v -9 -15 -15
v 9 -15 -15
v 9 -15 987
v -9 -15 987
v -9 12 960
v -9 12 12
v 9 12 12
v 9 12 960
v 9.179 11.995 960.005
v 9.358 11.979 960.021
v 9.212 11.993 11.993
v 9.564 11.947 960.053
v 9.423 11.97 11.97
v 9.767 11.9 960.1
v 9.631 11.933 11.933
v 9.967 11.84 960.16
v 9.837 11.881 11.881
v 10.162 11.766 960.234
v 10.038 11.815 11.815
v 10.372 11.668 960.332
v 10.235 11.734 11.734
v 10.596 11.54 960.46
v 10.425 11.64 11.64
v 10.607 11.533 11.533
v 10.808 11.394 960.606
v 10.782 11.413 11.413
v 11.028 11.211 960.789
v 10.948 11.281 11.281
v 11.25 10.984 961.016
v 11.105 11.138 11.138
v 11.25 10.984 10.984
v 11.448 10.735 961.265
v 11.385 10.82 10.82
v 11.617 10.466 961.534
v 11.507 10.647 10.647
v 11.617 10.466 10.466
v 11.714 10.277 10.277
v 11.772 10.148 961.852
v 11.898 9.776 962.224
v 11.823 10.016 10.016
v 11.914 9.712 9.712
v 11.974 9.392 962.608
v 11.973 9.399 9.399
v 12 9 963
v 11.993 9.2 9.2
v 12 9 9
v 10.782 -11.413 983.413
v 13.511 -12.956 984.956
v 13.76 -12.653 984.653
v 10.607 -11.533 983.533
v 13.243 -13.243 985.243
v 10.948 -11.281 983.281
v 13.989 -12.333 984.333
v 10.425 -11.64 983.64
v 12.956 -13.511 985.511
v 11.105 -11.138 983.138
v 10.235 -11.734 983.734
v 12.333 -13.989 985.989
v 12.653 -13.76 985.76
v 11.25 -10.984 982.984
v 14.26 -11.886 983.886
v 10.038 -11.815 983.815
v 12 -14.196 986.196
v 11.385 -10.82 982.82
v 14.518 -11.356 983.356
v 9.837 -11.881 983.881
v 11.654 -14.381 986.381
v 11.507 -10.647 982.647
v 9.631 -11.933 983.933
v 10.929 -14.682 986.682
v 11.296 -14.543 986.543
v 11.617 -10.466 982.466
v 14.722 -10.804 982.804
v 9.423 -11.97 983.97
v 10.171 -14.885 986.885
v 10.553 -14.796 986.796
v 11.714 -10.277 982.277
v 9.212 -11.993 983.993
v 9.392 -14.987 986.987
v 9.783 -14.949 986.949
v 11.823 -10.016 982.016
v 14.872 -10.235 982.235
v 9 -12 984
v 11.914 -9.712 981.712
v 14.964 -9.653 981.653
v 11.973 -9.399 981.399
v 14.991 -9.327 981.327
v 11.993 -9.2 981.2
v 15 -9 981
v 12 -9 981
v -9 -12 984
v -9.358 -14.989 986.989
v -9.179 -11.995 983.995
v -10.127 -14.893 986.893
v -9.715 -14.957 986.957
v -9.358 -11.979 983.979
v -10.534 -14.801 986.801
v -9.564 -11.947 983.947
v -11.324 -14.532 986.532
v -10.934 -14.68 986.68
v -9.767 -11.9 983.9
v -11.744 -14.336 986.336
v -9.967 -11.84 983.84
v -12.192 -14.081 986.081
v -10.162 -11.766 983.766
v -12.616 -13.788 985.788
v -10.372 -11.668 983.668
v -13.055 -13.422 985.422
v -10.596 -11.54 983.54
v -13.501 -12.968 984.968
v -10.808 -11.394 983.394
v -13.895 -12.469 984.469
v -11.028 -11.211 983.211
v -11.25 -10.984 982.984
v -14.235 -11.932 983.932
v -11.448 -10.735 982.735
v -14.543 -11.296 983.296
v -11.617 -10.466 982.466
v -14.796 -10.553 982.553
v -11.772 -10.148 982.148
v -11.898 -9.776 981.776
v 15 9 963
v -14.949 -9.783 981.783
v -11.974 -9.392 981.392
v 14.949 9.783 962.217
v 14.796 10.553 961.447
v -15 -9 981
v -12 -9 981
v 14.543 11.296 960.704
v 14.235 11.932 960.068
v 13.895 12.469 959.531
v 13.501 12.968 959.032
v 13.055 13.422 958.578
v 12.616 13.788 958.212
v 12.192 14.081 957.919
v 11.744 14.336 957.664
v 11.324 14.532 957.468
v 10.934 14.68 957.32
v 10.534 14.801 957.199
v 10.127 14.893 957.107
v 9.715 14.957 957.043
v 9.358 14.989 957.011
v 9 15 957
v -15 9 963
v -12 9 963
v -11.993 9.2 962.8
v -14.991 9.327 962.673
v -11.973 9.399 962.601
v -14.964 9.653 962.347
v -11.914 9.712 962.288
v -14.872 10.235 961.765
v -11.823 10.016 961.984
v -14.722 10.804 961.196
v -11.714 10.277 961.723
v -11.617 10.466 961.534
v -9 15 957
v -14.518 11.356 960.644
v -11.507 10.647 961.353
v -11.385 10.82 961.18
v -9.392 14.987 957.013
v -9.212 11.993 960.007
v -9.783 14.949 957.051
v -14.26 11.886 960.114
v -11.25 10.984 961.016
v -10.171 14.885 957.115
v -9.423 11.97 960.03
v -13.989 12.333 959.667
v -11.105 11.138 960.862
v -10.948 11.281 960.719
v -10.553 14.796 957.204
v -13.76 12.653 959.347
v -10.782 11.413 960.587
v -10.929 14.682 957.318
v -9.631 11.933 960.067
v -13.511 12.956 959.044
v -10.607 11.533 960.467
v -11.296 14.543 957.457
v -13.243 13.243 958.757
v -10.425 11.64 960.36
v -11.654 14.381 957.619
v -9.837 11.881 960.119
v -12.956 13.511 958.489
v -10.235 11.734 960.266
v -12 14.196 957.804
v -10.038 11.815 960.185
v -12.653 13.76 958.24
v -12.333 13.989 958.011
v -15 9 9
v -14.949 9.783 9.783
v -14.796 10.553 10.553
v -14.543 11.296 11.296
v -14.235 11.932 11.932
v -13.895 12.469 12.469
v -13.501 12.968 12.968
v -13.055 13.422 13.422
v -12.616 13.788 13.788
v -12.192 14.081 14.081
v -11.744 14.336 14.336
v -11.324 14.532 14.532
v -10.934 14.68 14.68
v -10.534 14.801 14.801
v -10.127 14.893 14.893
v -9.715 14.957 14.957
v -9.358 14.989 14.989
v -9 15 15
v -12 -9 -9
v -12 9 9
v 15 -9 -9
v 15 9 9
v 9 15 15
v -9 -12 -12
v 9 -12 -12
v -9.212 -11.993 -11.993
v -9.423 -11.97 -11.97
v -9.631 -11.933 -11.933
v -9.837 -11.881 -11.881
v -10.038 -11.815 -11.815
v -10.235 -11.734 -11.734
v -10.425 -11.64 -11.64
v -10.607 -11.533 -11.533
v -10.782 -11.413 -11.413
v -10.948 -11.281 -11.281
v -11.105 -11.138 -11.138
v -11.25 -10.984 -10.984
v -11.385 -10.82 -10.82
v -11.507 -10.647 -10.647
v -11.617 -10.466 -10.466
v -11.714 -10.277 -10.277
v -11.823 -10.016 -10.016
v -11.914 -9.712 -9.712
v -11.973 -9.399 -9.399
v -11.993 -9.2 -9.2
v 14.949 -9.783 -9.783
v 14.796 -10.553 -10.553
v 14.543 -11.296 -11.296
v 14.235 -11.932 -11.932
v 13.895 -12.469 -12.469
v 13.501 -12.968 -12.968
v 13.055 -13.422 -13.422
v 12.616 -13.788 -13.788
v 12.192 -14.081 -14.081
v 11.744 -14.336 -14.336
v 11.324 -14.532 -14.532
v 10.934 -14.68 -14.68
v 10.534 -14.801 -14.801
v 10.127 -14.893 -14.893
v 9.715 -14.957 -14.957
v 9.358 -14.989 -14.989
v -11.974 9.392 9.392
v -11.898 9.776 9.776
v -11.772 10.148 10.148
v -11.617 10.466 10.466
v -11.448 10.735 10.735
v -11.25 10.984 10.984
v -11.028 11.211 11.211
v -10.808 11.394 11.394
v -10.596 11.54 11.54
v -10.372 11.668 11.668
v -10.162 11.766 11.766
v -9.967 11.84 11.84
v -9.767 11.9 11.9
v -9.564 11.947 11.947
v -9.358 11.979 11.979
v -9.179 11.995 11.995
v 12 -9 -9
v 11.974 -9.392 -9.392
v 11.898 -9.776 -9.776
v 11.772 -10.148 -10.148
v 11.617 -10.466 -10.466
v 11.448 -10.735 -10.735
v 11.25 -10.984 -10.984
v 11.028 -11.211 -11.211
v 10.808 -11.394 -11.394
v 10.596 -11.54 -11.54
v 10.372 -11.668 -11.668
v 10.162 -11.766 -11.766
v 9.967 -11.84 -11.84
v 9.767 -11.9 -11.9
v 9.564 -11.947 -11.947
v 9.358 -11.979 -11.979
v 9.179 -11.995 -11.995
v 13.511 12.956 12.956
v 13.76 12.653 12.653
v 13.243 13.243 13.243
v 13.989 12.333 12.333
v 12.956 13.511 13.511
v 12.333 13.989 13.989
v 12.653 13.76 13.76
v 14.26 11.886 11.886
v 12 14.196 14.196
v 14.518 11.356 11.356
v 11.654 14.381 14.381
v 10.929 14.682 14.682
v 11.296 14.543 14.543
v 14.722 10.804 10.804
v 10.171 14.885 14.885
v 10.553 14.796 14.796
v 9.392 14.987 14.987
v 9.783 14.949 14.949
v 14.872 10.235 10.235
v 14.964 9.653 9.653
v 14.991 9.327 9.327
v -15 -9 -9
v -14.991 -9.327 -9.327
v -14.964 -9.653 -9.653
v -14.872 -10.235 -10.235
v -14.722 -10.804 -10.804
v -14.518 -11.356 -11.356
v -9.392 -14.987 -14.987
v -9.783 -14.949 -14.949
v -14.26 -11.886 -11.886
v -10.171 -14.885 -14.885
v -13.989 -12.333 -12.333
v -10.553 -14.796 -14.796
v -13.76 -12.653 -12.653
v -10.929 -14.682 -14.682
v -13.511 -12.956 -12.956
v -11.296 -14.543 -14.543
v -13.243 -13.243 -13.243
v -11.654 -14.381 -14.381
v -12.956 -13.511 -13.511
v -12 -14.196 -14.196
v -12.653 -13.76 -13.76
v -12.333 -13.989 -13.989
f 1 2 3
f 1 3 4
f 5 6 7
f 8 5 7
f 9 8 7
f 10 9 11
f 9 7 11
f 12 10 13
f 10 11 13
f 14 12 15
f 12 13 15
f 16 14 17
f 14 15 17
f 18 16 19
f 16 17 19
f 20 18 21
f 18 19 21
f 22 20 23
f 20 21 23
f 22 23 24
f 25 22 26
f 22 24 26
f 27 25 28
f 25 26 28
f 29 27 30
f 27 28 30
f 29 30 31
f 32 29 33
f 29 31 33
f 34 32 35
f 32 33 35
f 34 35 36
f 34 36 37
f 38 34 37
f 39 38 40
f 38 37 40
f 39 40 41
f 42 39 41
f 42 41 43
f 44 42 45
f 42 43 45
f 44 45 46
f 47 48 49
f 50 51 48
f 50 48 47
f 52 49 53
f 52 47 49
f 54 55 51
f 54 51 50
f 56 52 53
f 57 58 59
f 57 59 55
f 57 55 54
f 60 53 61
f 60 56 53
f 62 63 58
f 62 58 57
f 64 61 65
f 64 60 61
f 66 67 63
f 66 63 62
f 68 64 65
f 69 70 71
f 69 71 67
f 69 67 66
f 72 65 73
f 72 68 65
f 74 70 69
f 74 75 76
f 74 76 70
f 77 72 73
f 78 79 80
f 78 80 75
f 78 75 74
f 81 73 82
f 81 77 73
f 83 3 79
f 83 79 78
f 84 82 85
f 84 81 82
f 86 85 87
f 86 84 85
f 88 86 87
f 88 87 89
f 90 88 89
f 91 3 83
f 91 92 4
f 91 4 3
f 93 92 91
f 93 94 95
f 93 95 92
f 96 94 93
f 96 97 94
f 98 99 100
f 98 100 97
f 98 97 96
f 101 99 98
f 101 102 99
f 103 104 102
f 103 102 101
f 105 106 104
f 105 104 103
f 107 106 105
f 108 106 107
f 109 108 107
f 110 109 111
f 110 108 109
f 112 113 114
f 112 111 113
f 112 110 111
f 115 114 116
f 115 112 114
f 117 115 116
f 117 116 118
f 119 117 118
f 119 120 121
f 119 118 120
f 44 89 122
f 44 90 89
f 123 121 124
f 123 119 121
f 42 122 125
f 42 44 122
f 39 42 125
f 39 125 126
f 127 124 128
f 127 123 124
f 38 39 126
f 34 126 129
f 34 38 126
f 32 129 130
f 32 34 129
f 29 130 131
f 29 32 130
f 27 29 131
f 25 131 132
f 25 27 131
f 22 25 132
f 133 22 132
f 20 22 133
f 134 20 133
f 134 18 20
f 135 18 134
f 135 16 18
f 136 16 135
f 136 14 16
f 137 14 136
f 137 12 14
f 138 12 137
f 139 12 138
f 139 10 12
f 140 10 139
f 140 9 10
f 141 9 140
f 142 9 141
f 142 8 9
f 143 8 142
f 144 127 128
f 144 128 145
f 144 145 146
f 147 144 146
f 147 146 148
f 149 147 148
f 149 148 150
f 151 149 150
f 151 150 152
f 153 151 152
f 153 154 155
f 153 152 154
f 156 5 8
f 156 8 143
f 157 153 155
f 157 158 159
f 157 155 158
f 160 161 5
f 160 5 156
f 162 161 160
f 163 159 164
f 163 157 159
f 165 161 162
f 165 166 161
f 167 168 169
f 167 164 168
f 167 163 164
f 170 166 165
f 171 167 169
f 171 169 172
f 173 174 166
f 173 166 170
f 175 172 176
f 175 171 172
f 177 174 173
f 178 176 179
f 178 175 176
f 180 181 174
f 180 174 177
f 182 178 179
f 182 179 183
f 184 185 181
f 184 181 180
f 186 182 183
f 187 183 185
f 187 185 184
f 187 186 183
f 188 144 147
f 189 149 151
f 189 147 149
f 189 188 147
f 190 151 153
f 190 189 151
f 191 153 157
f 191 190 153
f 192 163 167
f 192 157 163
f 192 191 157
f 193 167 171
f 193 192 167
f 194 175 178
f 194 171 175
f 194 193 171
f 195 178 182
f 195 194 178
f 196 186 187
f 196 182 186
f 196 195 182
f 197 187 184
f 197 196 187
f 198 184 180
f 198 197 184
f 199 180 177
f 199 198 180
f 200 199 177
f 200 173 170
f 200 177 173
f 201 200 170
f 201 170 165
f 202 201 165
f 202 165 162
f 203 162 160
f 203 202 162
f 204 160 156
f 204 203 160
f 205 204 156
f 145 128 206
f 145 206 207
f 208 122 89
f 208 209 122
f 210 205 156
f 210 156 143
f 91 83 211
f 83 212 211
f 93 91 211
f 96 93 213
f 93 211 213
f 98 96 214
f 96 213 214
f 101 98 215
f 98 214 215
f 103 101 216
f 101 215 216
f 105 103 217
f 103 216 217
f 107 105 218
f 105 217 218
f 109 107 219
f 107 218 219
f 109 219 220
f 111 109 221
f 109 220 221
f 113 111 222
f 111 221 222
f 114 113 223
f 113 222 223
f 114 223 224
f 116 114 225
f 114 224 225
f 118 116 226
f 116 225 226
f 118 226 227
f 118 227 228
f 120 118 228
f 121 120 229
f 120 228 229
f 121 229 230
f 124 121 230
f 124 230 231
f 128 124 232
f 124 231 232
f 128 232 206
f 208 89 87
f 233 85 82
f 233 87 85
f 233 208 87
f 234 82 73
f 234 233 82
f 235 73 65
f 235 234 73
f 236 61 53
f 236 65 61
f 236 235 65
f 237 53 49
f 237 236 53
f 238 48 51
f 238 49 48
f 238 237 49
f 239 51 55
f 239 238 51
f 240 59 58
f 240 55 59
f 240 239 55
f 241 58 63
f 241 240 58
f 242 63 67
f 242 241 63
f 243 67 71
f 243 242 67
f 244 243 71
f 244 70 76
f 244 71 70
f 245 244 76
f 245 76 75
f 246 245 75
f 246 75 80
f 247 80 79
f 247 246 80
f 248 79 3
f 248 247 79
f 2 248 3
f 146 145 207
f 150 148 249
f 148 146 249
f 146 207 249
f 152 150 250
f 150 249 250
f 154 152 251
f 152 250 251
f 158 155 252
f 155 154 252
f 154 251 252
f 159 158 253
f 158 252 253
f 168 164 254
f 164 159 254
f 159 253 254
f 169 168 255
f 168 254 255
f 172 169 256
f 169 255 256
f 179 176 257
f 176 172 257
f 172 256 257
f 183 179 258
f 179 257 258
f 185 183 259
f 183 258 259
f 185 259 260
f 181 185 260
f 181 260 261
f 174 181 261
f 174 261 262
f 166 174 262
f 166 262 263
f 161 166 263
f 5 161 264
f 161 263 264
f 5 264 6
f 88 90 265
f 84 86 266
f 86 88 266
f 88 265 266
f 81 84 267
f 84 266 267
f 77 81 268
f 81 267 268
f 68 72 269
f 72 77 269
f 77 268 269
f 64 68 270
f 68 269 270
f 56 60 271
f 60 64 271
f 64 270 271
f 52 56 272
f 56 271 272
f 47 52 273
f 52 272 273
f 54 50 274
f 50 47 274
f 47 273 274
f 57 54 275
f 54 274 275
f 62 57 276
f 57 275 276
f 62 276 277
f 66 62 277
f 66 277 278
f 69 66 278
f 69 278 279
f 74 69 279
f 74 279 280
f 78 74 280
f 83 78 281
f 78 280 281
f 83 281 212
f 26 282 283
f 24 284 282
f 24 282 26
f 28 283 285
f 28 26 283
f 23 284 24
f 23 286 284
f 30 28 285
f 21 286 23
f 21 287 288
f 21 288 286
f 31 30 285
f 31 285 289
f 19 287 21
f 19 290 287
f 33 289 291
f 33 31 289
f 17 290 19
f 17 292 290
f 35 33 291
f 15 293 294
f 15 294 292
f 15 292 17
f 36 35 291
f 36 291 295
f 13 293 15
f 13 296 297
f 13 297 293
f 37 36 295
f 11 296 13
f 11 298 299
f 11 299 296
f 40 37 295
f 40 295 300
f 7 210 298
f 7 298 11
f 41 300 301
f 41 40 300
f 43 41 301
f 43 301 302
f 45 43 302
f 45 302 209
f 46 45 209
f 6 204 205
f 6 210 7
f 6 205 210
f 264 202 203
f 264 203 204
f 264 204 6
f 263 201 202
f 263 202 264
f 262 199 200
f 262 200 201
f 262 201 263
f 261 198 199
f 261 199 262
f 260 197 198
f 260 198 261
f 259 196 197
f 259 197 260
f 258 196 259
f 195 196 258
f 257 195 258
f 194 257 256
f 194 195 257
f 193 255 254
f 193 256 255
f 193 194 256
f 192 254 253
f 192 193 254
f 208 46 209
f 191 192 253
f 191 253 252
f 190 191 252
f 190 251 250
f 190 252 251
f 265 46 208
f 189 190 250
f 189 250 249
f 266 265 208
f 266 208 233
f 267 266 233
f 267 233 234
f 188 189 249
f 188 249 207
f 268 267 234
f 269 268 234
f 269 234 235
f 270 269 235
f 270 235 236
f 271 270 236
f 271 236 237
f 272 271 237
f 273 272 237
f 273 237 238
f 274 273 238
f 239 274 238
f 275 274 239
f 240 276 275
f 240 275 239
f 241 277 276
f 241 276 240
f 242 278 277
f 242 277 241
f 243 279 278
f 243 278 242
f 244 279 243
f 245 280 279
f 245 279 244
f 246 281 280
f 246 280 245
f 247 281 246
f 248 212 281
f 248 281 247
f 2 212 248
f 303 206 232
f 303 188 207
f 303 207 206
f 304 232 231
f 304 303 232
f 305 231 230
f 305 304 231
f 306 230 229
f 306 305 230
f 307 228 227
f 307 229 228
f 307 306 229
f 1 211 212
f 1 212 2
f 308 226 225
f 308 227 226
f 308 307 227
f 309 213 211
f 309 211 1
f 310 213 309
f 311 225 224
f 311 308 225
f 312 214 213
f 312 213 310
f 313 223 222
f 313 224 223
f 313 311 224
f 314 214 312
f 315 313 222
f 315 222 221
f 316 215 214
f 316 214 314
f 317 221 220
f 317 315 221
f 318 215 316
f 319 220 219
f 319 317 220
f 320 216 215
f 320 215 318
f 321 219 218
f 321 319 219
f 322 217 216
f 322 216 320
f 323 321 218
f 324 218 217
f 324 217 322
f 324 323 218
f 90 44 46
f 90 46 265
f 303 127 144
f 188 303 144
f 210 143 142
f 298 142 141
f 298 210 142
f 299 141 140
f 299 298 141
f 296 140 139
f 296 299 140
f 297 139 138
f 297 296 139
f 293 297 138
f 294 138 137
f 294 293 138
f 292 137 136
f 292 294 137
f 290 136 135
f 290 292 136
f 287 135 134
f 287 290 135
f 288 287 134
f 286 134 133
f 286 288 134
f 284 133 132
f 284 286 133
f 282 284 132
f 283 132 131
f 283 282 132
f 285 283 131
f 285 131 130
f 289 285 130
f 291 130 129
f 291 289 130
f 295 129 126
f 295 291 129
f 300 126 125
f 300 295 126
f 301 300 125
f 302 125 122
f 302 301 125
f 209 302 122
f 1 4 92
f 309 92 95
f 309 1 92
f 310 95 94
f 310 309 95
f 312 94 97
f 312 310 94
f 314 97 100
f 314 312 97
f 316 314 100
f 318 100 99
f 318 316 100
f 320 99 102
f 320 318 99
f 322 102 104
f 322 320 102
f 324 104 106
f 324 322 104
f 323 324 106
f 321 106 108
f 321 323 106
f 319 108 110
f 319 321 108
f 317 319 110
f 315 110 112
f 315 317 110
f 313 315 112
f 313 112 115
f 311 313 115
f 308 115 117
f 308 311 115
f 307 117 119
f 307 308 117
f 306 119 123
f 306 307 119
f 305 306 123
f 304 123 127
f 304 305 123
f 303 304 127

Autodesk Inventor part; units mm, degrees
ref_plane "Start Plane" through (0, 0, -15) normal (0, 0, 1) x (1, 0, 0)
ref_plane "End Plane" through (0, 0, 987) normal (0, 0, 1) x (1, 0, 0)
sketch "Sketch" plane through (0, 0, 0) normal (0, 0, 1) x (1, 0, 0)
  line L0 (-15, -9) -> (-15, 9)
  line L1 (-9, 15) -> (9, 15)
  line L2 (15, 9) -> (15, -9)
  line L3 (9, -15) -> (-9, -15)
  arc A0 (-15, -9) -> (-9, -15) centre (-9, -9) ccw
  arc A1 (-9, 15) -> (-15, 9) centre (-9, 9) ccw
  arc A2 (15, 9) -> (9, 15) centre (9, 9) ccw
  arc A3 (9, -15) -> (15, -9) centre (9, -9) ccw
  arc A4 (-9, 12) -> (-12, 9) centre (-9, 9) ccw
  line L4 (-9, 12) -> (9, 12)
  arc A5 (12, 9) -> (9, 12) centre (9, 9) ccw
  line L5 (12, 9) -> (12, -9)
  arc A6 (9, -12) -> (12, -9) centre (9, -9) ccw
  line L6 (9, -12) -> (-9, -12)
  arc A7 (-12, -9) -> (-9, -12) centre (-9, -9) ccw
  line L7 (-12, -9) -> (-12, 9)
  line L8 (0, 22.7397) -> (0, -22.7397) construction
  line L9 (-22.7397, 0) -> (22.7397, 0) construction
  dimension "d7" = 6
  dimension "d10" = 30
  dimension "d11" = 30
  dimension "d12" = 3
  dimension "d15" = 15
  dimension "d16" = 15
extrude "Body" add sketch "Sketch" along normal up to surface (1002 mm away) from surface at -15
sketch "Sketch3" plane through (0, 0, 0) normal (0, 0, 1) x (1, 0, 0)
  line L0 (0, 0) -> (10, 0)
ref_plane "Work Plane3" through (0, 0, 0) normal (0, -1, 0) x (1, 0, 0)
ref_plane "Work Plane6" through (0, -15, 987) normal (0, 0.7071, 0.7071) x (1, 0, 0)
split "Split3" plane through (0, -15, 987) removes the side toward (0, 0.7071, 0.7071)
ref_plane "Work Plane7" through (-0.0002, -15, -15) normal (0, 0.7071, -0.7071) x (1, 0, 0)
split "Split4" plane through (-0.0002, -15, -15) removes the side toward (0, 0.7071, -0.7071)
sketch "Sketch4" plane through (0, 0, 0) normal (0, -1, 0) x (1, 0, 0)
  line L0 (-2, -15) -> (12, -15) projected
  line L1 (-2, 987) -> (12, 987) projected
  dimension "d18" = 1002
equation "\"d7\" = G_IR"
equation "\"d10\" = G_H"
equation "\"d11\" = G_W"
equation "\"d12\" = G_T"
equation "\"d15\" = 0.5 * d10"
equation "\"d16\" = 0.5 * d11"
equation "\"d3\" = G_L"
equation "\"G_W\" = 30"
equation "\"G_H\" = 30"
equation "\"G_T\" = 3"
equation "\"G_IR\" = 6"
equation "\"G_L\" = d18"
equation "\"G_OFFSET_START\" = 14.99997"
equation "\"G_OFFSET_END\" = 15"
equation "\"d13\" = -G_OFFSET_START"
equation "\"d14\" = G_OFFSET_END + B_L"
equation "\"B_L\" = 972"
properties part number "DIN EN 10219-2 - 30 x 30 x 3  - 1002" material "Steel, Mild"
